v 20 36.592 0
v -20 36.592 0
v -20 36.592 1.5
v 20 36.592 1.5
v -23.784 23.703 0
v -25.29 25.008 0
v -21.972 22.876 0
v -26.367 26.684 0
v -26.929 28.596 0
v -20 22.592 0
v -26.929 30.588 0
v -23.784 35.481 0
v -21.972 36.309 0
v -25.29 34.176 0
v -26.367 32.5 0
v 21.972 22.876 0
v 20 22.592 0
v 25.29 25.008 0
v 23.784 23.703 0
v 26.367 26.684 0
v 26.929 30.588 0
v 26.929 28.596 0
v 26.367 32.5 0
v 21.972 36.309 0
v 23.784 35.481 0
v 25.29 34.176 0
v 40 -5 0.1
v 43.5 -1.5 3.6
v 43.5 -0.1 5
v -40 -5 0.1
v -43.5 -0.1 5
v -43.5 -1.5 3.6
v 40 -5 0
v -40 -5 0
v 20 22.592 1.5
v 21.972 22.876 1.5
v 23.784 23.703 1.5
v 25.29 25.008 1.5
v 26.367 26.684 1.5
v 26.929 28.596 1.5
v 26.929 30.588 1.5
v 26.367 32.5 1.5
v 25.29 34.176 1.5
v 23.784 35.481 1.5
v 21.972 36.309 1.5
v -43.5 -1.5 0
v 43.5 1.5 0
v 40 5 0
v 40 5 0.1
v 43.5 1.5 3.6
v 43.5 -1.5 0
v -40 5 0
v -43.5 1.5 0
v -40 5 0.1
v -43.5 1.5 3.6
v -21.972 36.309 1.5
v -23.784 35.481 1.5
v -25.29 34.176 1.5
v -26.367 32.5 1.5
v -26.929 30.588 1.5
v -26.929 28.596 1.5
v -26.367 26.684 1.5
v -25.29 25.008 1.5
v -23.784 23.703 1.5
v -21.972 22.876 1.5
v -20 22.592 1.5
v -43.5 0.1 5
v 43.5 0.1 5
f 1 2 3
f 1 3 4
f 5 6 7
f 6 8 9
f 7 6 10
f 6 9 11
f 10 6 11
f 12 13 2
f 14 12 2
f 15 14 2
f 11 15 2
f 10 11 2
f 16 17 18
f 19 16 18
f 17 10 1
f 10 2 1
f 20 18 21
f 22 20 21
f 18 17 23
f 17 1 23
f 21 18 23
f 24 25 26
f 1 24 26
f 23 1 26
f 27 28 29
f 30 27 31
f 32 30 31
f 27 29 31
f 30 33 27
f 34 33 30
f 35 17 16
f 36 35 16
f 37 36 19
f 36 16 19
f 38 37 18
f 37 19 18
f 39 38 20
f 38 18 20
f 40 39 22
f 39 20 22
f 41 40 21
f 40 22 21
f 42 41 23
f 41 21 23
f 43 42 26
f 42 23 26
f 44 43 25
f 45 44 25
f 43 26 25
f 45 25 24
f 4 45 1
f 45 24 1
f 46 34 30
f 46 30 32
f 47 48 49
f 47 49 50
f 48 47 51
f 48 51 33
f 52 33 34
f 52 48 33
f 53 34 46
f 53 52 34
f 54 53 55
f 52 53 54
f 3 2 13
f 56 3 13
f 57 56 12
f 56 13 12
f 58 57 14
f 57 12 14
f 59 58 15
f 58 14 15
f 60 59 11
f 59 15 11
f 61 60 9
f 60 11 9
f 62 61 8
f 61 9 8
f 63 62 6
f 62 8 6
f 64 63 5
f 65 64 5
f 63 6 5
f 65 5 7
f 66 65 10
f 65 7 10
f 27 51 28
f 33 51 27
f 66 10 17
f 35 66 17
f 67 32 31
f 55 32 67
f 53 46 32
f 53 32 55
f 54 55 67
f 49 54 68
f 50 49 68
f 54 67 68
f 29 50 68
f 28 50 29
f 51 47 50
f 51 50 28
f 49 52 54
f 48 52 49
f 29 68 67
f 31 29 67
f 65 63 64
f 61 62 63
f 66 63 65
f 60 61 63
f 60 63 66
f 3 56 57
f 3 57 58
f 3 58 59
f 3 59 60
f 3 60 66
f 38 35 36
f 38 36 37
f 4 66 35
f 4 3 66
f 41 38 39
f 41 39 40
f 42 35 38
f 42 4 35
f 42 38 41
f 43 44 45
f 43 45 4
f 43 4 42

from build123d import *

# Parameters (mm, degrees)
PAD_DEPTH    = 1.5
PAD001_DEPTH = 5
CHAMFER_SIZE = 4.9


with BuildPart() as pad:
    # Sketch → Pad (new body)
    with BuildSketch(Plane.XY):
        with BuildLine():
            ThreePointArc((-20, 36.592062), (-27, 29.592062), (-20, 22.592062))
            Line((-20, 22.592062), (20, 22.592062))
            ThreePointArc((20, 22.592062), (27, 29.592062), (20, 36.592062))
            Line((-20, 36.592062), (20, 36.592062))
        make_face()
    extrude(amount=PAD_DEPTH)


with BuildPart() as chamfer_body:
    # Sketch001 → Pad001 (new body)
    with BuildSketch(Plane.XY):
        Polygon((-40, 5), (40, 5), (43.5, 1.5), (43.5, -1.5), (40, -5), (-40, -5), (-43.5, -1.5), (-43.5, 1.5), align=None)
    extrude(amount=PAD001_DEPTH)

    # Chamfer
    chamfer_edges = [chamfer_body.edges().sort_by_distance(p)[0] for p in [
        (0, 5, 5),
        (0, -5, 5),
    ]]
    chamfer(chamfer_edges, length=CHAMFER_SIZE)


solid = Compound([pad.part, chamfer_body.part])
